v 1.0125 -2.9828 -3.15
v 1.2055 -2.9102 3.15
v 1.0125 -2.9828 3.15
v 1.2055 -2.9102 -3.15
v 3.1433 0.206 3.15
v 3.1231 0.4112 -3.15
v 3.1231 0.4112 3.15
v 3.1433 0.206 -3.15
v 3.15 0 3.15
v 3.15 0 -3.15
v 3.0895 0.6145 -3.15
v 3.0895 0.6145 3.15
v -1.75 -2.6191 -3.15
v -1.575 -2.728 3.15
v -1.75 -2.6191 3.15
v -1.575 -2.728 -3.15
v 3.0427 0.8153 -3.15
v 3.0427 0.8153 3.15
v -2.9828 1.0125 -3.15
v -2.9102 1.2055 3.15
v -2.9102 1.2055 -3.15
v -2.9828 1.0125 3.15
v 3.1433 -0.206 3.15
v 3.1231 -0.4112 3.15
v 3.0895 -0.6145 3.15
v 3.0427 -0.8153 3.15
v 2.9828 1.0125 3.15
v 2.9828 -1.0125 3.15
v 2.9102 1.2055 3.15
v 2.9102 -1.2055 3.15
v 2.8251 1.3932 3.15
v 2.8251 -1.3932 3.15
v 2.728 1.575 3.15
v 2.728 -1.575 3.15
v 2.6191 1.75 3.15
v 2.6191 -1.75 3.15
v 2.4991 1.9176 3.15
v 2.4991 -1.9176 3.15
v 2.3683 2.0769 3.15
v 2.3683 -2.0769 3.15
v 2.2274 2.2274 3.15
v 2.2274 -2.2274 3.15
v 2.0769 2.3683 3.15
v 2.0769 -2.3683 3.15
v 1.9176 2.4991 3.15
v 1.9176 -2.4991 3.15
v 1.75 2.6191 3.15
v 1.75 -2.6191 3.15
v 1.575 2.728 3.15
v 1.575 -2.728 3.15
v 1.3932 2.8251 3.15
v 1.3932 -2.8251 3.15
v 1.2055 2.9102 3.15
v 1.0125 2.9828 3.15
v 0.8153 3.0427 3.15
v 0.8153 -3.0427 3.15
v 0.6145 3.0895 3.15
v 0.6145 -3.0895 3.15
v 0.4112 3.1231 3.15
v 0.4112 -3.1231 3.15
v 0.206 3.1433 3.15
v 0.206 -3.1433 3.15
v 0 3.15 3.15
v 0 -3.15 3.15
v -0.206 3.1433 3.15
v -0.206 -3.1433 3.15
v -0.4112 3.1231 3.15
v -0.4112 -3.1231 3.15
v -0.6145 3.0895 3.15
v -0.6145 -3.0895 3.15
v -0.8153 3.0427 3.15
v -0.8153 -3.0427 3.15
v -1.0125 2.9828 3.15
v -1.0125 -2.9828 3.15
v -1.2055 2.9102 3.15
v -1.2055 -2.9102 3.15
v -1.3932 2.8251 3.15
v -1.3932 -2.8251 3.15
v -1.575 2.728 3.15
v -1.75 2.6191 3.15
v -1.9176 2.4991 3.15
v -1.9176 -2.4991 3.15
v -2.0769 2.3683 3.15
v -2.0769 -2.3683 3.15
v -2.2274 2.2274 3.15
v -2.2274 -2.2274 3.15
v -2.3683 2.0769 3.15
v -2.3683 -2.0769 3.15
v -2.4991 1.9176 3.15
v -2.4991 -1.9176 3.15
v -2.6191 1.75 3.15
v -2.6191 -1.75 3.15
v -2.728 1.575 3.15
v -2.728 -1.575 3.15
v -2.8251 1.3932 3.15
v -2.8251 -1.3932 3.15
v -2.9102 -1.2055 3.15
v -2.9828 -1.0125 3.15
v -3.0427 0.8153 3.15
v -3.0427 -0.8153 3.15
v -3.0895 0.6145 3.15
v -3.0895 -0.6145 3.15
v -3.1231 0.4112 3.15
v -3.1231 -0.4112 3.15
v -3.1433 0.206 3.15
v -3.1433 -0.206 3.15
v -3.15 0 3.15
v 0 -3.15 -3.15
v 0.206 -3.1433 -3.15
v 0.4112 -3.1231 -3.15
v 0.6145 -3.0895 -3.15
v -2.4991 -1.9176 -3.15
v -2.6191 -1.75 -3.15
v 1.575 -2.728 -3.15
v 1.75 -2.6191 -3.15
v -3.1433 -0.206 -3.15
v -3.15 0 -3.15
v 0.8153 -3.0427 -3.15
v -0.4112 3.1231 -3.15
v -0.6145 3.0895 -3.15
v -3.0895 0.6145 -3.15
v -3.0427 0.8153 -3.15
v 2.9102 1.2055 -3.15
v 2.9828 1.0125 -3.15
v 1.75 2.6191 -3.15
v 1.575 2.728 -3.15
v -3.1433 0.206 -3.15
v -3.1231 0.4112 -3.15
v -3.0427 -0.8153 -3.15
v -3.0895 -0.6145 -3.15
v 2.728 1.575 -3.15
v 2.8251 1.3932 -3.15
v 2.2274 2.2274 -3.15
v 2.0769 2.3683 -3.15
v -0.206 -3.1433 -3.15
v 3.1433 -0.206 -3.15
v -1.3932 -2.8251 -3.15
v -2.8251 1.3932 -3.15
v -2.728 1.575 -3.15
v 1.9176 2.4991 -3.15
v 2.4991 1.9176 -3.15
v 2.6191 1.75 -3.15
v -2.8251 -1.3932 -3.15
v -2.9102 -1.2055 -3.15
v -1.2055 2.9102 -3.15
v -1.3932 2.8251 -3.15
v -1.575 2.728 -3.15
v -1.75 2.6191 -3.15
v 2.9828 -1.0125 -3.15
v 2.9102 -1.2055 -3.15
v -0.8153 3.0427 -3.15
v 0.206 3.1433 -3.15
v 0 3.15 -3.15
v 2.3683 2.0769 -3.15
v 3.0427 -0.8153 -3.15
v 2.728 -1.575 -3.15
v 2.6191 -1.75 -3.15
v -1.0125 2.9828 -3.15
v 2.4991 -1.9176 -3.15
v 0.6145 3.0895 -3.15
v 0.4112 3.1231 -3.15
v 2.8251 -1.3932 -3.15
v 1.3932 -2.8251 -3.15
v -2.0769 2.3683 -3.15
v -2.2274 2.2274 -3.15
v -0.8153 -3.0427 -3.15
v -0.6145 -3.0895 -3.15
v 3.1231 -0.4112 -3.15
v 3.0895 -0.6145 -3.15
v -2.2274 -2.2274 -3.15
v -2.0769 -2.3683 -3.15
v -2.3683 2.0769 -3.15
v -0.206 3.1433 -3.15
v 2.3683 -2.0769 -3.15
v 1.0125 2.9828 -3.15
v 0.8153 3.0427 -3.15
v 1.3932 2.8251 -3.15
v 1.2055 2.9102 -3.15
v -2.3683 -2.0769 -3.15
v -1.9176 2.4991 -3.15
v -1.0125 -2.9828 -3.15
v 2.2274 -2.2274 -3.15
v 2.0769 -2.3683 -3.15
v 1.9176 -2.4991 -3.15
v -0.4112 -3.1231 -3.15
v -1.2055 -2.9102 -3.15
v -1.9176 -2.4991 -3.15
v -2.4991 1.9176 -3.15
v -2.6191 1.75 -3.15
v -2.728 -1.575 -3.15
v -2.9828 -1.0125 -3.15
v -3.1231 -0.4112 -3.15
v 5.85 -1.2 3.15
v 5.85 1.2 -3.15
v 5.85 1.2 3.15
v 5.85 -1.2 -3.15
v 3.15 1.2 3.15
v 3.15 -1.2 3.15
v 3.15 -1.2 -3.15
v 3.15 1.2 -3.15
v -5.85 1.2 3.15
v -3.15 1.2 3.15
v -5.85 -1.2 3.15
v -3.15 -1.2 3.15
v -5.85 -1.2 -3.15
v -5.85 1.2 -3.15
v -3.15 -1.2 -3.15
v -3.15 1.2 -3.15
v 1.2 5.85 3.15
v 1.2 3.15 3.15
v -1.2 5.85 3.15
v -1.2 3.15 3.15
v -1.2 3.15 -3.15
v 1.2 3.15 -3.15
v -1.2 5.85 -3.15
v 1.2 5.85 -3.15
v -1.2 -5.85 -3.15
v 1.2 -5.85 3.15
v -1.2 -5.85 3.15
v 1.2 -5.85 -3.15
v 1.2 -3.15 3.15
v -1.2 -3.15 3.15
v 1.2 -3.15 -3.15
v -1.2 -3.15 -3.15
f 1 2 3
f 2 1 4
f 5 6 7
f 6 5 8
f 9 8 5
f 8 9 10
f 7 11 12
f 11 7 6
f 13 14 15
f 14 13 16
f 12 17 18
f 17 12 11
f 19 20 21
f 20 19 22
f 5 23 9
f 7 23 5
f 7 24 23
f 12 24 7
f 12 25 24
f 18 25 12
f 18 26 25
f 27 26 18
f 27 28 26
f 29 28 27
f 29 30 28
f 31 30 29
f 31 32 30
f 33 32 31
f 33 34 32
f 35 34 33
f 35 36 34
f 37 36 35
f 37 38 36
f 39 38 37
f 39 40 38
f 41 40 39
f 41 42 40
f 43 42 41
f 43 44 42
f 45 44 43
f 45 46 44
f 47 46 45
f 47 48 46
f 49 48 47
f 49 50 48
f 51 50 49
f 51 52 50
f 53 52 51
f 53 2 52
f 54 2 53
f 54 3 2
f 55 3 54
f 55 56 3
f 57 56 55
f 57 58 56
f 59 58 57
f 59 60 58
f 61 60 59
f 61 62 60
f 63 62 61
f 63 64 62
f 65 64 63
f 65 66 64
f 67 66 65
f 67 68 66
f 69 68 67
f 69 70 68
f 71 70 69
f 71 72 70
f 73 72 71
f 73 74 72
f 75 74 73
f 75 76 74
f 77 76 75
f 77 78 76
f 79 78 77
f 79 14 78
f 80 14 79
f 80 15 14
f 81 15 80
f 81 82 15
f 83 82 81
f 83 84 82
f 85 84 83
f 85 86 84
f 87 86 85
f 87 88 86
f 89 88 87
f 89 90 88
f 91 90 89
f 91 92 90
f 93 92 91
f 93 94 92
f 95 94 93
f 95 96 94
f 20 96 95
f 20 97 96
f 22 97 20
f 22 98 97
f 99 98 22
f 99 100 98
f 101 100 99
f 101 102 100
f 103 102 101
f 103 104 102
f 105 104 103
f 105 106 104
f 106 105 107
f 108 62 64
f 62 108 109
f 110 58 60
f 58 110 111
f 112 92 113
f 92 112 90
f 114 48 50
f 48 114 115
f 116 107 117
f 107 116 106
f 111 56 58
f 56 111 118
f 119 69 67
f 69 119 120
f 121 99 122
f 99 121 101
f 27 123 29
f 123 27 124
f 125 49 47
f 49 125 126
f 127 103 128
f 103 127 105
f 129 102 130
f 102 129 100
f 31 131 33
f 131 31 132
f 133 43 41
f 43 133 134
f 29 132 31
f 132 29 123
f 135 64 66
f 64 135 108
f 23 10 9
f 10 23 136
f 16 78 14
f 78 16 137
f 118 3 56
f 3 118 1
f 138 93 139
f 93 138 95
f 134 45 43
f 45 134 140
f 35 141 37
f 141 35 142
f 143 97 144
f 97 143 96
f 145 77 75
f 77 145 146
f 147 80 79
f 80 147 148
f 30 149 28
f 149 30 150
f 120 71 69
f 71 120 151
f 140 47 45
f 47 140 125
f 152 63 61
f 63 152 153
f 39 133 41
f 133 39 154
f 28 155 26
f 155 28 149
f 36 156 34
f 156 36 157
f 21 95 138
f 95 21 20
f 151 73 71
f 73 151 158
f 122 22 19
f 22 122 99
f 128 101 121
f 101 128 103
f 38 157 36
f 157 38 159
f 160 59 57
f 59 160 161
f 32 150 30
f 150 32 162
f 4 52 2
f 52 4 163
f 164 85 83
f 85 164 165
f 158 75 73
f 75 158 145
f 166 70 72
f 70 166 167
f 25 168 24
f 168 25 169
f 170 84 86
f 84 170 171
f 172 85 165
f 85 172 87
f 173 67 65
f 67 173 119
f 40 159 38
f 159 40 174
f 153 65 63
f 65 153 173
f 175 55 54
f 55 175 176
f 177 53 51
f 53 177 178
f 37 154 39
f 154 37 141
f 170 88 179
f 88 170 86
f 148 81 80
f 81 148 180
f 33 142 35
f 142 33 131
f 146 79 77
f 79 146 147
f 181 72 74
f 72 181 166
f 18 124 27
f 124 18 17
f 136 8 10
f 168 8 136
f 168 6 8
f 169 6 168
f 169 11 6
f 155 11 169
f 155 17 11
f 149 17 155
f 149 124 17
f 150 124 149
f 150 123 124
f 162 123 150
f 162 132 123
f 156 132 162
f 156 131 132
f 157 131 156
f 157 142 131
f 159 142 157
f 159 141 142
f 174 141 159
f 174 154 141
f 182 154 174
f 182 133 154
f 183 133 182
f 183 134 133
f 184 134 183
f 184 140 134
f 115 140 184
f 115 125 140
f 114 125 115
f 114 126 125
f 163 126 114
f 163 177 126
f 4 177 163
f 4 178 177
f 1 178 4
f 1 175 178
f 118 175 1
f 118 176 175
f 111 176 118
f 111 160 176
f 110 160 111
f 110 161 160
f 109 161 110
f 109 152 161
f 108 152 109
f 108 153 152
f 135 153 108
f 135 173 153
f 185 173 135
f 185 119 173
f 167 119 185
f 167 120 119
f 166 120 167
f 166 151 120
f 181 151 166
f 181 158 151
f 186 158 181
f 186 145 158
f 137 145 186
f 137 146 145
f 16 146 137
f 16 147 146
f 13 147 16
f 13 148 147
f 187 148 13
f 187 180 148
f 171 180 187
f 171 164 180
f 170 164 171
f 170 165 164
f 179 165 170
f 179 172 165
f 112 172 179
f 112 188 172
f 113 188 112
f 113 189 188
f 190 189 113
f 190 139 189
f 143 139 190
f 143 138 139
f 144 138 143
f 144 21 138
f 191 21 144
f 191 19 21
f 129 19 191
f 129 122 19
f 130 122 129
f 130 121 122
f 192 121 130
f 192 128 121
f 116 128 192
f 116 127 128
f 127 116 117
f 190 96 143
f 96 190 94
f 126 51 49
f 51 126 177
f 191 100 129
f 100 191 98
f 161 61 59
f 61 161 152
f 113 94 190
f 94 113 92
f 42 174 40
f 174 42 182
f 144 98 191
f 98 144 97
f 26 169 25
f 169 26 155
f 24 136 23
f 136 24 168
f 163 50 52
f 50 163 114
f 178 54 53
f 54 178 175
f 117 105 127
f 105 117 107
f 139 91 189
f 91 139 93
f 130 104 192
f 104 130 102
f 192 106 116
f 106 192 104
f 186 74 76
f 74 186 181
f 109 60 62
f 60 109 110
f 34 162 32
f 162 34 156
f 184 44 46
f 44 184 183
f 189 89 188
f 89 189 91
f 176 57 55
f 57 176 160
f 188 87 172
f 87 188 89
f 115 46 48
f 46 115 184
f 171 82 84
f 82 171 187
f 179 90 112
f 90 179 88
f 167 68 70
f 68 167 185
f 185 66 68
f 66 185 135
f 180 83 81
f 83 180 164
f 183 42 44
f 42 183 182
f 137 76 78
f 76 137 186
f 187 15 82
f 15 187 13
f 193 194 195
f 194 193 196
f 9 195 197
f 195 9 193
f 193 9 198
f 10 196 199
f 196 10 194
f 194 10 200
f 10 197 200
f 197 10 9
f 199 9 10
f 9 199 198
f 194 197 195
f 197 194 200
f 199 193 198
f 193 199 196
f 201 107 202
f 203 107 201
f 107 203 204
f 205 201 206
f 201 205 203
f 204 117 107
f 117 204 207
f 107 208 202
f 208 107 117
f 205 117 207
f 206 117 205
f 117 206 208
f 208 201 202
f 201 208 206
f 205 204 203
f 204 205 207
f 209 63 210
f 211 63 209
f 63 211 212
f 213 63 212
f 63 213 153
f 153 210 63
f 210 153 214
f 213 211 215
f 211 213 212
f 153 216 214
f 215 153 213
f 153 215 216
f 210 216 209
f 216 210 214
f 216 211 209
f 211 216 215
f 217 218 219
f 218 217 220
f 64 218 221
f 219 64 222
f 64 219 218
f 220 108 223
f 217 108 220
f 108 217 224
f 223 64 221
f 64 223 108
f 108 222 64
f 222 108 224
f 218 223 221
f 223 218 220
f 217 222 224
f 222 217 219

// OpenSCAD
$fn=96;

bbox_xy = 11.7;
bbox_z  = 6.3;

core_d = 6.3;
core_h = bbox_z;

lug_len = (bbox_xy - core_d)/2;
lug_w   = 2.4;
lug_h   = bbox_z;

module core() {
    cylinder(d=core_d, h=core_h, center=true);
}

module lug_x() {
    translate([core_d/2 + lug_len/2, 0, 0])
        cube([lug_len, lug_w, lug_h], center=true);
}

module lug_y() {
    rotate([0,0,90]) lug_x();
}

module hub() {
    union() {
        core();
        lug_x();
        rotate([0,0,180]) lug_x();
        lug_y();
        rotate([0,0,180]) lug_y();
    }
}

hub();
